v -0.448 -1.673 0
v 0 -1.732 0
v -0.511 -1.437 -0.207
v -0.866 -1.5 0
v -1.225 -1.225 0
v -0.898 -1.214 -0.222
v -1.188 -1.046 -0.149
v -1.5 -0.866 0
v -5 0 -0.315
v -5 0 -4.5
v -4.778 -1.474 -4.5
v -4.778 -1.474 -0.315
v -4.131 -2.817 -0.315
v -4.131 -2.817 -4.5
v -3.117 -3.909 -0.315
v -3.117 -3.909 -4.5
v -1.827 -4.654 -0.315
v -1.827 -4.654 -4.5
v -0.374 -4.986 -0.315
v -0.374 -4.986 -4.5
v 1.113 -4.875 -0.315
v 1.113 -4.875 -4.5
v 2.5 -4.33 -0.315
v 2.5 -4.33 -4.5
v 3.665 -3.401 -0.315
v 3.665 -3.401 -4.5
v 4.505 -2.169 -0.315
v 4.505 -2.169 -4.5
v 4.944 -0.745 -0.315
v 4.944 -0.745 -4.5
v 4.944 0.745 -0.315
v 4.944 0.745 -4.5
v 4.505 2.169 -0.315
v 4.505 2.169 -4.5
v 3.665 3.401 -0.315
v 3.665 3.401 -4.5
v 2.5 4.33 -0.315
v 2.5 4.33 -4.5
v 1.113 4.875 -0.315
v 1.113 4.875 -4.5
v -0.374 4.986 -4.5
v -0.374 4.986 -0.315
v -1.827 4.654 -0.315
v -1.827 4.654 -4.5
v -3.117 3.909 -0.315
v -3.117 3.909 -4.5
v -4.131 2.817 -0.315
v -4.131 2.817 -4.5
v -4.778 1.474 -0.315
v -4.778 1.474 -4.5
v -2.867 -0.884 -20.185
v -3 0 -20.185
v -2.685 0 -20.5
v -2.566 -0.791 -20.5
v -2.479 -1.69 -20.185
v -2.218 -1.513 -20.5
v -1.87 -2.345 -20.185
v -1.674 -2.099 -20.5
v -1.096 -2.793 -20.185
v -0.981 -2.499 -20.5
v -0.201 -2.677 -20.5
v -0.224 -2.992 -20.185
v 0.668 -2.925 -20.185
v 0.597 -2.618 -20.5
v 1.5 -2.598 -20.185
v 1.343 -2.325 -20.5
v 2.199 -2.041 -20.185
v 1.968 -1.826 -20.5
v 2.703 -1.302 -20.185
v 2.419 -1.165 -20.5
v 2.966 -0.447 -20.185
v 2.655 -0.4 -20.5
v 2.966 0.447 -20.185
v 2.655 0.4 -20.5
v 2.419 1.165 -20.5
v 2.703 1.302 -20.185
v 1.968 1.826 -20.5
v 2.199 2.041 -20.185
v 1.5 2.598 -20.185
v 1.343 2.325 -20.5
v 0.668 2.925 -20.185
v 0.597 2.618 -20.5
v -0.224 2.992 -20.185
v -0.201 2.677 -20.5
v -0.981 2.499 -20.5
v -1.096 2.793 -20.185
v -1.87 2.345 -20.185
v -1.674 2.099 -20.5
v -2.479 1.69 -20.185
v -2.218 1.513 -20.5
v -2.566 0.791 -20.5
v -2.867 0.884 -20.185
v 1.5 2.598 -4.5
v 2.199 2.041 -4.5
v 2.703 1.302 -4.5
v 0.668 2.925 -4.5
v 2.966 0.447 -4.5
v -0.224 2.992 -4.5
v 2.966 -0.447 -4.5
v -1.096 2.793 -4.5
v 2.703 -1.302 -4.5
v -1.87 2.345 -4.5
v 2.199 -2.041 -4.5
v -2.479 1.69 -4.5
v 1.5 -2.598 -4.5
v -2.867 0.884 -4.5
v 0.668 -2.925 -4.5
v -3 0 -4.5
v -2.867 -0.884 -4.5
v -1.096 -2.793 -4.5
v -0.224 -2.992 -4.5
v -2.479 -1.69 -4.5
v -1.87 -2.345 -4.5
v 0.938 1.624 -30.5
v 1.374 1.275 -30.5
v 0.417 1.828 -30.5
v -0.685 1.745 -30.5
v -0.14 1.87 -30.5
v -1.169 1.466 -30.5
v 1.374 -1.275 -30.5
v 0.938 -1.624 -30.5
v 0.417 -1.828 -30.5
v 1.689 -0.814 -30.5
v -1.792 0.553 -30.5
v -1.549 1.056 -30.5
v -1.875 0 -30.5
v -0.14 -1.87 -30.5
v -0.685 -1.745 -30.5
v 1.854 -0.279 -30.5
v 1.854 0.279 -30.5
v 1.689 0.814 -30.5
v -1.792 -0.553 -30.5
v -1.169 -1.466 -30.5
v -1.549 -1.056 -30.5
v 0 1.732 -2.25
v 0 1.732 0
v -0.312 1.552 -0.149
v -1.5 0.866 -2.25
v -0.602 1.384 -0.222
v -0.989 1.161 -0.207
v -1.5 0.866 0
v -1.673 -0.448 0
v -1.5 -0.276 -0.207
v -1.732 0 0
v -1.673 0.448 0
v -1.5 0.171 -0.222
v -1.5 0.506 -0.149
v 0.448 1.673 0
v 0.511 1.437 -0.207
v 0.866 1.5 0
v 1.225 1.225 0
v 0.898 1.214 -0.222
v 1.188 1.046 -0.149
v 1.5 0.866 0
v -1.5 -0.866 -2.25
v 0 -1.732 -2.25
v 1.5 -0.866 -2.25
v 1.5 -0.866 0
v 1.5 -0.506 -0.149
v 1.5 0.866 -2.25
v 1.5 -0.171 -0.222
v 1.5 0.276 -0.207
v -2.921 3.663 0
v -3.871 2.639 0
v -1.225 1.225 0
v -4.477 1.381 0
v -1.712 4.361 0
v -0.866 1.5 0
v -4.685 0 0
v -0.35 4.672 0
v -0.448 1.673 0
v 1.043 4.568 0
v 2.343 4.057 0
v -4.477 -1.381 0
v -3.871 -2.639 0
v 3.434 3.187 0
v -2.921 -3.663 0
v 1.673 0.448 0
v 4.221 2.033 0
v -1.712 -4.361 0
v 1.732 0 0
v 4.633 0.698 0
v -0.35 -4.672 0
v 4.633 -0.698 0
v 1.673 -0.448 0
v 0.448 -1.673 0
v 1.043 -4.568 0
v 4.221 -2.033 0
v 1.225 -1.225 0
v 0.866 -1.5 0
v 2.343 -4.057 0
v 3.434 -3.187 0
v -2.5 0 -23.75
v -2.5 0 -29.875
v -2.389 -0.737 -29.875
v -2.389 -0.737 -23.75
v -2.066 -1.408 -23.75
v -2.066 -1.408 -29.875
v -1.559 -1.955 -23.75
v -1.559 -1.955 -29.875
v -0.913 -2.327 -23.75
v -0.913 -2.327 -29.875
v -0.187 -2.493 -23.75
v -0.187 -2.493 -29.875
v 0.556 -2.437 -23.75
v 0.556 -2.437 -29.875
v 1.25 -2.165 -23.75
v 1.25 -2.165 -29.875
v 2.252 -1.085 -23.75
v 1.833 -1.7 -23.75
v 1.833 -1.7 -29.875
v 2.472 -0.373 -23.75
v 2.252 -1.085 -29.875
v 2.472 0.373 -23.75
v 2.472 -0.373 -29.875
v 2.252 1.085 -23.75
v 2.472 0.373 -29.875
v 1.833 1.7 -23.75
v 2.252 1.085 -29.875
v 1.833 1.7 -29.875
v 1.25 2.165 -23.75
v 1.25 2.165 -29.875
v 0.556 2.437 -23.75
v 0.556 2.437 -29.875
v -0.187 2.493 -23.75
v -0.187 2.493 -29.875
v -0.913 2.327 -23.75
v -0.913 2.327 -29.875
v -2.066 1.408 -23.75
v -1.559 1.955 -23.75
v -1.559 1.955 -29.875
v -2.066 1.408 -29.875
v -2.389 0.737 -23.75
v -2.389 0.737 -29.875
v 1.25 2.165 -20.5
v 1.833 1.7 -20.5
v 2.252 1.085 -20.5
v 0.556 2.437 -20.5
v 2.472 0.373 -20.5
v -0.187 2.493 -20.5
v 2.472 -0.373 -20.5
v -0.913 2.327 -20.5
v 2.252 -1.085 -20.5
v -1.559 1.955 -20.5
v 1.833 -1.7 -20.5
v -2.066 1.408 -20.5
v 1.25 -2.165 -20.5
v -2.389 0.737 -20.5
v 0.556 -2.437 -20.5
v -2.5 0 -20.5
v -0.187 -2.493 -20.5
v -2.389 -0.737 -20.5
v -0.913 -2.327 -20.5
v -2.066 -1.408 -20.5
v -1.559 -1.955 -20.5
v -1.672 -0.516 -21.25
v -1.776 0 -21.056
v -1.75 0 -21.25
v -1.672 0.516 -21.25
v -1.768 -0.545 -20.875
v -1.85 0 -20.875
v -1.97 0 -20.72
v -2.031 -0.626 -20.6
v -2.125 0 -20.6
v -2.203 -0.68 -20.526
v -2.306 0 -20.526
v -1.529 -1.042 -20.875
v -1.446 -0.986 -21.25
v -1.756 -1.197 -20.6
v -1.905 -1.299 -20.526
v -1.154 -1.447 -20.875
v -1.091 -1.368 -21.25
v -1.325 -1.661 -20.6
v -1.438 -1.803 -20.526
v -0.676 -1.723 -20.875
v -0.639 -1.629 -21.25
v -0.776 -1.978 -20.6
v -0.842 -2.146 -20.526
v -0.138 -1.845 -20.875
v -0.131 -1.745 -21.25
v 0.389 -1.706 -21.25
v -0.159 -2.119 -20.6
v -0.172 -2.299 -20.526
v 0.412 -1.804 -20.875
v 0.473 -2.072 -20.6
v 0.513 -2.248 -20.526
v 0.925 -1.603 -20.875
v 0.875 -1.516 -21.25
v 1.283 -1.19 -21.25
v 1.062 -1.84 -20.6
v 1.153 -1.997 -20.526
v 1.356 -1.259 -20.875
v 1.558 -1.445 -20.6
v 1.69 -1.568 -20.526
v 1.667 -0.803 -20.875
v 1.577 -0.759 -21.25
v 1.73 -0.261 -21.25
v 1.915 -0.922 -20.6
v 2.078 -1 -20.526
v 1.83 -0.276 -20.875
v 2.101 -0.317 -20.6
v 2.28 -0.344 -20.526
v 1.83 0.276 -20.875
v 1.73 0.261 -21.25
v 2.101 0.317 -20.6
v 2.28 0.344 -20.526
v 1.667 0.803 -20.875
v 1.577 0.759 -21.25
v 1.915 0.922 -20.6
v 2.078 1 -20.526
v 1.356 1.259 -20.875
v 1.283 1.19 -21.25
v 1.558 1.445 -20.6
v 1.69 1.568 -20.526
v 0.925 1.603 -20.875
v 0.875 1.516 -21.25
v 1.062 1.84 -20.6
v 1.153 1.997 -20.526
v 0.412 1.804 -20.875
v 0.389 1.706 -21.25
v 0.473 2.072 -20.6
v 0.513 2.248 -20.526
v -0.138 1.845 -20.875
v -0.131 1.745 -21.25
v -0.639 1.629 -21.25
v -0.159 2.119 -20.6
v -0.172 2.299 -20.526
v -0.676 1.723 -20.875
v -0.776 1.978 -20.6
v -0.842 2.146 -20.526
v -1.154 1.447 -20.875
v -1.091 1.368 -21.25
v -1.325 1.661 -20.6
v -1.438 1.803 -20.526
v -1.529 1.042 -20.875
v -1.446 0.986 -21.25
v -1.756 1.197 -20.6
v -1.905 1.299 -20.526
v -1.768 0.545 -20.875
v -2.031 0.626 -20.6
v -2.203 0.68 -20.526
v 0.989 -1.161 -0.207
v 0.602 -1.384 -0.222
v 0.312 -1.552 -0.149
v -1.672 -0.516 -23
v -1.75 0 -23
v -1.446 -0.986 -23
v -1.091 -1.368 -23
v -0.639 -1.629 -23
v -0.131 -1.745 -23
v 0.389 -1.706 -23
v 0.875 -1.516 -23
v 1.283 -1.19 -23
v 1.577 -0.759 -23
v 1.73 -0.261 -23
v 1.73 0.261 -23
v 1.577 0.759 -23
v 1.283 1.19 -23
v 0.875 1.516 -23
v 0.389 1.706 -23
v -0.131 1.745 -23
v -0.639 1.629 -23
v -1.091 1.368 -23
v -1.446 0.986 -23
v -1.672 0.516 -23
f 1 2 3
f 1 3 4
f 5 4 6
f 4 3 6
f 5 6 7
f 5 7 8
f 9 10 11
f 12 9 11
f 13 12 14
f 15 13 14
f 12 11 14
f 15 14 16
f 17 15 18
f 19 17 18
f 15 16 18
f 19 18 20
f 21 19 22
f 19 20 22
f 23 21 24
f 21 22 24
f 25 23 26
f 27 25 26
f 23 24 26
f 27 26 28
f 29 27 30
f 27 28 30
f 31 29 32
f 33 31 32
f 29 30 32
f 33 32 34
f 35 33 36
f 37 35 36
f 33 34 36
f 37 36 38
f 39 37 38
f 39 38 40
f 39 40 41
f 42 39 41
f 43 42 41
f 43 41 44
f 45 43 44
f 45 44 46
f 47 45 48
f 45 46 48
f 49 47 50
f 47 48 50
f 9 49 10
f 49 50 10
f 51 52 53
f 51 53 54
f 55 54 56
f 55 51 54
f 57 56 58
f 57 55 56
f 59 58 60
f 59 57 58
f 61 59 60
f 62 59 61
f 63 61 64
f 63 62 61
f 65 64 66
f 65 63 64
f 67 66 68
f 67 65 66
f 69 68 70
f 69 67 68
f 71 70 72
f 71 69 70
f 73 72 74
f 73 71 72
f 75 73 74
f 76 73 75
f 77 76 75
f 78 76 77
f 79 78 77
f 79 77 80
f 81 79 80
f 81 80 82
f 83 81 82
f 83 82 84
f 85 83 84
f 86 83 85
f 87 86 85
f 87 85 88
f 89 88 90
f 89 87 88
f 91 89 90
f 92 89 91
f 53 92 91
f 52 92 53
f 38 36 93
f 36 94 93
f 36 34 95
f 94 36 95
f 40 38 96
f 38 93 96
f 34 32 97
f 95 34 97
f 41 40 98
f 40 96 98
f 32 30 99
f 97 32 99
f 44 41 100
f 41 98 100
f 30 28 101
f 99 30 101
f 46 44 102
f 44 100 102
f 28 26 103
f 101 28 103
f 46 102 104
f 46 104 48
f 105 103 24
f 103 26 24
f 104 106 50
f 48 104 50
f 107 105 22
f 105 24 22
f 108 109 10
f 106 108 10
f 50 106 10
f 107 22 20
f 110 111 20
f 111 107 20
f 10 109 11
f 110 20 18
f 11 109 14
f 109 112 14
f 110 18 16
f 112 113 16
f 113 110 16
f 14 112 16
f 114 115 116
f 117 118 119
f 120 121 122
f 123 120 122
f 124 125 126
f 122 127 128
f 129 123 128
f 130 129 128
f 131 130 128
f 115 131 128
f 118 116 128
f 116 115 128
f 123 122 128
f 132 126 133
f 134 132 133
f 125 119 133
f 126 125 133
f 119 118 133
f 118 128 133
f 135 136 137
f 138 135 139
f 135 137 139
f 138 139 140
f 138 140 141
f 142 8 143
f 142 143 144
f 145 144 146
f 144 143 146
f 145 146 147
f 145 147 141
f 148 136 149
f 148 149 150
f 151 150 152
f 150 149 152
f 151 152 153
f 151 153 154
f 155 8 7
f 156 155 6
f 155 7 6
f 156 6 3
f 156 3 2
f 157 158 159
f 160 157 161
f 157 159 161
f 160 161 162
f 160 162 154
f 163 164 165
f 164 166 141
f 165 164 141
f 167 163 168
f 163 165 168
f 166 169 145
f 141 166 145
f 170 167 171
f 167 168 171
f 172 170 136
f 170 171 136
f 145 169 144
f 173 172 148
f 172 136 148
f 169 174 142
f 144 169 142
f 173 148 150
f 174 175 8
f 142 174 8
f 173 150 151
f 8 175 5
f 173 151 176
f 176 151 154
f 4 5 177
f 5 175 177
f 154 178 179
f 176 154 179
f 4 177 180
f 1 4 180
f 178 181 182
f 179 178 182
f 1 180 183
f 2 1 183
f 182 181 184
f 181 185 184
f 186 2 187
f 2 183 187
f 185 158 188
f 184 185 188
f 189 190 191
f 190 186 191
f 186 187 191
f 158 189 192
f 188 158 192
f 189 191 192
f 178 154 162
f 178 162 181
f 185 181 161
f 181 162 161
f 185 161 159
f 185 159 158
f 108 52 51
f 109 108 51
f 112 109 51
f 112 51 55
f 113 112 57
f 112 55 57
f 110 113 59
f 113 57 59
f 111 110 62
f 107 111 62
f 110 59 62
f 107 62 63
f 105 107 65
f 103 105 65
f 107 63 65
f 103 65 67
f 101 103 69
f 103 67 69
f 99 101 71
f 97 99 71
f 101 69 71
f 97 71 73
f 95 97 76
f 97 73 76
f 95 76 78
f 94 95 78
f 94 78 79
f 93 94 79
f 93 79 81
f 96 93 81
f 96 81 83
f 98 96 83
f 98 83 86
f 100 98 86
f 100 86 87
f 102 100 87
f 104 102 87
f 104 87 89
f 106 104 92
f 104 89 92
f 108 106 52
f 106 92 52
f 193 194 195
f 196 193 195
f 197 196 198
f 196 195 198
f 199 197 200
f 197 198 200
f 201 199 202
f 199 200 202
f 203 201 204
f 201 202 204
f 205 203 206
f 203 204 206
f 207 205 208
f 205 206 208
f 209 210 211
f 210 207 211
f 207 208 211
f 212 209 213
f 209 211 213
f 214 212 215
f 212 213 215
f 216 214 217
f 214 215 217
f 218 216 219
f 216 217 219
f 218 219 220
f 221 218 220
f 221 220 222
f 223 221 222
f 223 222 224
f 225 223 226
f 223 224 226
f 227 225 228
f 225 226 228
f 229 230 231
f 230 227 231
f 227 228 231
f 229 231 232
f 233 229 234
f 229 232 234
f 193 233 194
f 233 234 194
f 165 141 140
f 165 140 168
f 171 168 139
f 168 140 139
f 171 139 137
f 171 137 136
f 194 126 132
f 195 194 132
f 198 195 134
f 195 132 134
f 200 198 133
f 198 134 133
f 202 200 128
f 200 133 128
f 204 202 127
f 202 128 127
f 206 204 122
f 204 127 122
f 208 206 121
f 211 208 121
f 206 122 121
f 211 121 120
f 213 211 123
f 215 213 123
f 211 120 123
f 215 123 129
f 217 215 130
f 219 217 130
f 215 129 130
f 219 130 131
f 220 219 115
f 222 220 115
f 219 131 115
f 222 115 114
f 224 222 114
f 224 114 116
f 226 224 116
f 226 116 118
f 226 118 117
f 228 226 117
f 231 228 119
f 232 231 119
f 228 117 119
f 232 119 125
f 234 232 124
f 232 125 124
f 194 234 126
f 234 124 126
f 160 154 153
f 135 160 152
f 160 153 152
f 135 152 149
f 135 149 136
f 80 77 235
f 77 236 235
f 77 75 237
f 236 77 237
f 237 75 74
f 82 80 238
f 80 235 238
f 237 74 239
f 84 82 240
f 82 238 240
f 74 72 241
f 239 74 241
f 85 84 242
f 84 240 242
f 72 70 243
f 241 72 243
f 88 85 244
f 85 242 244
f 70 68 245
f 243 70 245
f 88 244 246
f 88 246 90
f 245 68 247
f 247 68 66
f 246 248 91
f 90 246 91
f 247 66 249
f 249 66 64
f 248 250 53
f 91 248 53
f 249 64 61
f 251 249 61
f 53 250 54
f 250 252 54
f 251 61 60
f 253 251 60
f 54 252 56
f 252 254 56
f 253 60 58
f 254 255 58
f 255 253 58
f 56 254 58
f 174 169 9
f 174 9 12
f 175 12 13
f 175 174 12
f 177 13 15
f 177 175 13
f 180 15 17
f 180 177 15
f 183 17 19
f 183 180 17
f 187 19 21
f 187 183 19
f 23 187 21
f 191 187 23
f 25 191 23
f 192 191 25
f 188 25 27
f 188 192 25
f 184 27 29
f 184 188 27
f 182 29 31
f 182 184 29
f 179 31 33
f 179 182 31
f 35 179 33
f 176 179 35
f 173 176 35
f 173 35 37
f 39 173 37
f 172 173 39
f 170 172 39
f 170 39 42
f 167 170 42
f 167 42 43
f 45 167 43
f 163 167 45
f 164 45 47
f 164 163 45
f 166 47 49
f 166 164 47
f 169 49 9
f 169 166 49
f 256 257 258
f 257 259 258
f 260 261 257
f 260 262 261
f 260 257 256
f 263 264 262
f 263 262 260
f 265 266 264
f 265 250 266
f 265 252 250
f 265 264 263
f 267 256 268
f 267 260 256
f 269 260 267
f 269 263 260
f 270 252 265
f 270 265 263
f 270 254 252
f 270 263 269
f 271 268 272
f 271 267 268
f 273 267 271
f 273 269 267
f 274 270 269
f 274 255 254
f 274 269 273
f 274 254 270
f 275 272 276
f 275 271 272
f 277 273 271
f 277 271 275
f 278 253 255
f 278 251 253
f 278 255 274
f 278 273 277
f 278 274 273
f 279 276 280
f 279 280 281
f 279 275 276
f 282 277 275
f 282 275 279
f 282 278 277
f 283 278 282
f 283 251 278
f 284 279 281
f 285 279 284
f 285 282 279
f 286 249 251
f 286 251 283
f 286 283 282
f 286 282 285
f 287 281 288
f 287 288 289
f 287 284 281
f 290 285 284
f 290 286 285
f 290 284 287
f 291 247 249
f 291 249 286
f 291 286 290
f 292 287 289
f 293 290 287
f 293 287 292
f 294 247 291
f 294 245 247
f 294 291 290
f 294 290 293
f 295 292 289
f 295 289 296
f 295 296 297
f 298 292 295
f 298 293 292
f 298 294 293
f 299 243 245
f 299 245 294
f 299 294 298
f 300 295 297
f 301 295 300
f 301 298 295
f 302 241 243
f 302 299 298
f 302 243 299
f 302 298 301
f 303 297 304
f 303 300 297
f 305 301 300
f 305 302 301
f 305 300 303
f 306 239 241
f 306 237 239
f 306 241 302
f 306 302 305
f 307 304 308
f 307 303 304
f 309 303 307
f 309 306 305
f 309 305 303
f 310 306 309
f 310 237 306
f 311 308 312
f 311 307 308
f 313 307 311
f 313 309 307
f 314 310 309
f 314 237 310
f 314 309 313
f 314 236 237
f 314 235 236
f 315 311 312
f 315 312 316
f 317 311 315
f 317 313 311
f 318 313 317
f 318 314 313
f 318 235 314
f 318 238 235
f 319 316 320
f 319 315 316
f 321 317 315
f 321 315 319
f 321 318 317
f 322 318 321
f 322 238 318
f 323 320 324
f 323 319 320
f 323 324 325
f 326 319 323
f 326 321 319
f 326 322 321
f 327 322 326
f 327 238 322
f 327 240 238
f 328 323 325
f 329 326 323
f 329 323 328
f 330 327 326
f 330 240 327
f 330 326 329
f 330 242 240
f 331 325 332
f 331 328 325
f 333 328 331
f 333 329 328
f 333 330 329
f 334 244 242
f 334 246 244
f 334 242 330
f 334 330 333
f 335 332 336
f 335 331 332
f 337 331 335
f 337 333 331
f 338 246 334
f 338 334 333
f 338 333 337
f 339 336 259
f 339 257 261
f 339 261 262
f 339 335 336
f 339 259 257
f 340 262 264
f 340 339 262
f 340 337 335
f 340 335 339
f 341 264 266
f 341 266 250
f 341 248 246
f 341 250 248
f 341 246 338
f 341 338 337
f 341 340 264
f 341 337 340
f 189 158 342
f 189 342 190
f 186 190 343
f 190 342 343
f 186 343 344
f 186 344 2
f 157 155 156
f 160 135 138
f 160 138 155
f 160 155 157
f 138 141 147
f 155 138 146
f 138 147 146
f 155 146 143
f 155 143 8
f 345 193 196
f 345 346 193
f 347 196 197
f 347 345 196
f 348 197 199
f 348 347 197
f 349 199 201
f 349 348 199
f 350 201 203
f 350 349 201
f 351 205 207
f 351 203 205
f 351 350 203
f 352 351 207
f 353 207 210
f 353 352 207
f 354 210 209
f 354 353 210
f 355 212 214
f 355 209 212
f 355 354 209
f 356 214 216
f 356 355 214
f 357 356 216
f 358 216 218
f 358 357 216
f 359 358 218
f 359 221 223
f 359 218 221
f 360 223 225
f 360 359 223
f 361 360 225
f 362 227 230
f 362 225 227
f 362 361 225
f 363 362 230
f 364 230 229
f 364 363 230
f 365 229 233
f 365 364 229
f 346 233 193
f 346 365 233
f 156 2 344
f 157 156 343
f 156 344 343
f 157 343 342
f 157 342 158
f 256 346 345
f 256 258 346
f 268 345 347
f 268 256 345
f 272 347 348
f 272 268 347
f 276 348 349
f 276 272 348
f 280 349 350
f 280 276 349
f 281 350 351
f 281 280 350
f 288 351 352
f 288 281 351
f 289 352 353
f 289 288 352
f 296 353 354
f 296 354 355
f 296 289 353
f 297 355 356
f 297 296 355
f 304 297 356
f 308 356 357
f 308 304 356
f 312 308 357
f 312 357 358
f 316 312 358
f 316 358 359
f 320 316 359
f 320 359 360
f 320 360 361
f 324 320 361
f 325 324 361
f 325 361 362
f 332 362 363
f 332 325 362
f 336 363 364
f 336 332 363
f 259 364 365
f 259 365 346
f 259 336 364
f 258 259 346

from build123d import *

# Parameters (mm, degrees)
CHAMFER1_SIZE      = 0.625
CHAMFER2_SIZE      = 0.315
CUT_EXTRUDE3_DEPTH = 2.25


with BuildPart() as part:
    # Sketch1 → Revolve1 (revolve)
    with BuildSketch(Plane(origin=(0, 0, 0), x_dir=(0, 0, -1), z_dir=(1, 0, 0))):
        Polygon((0, 5), (4.5, 5), (4.5, 3), (20.5, 3), (20.5, 2.5), (30.5, 2.5), (30.5, 0), (0, 0), align=None)
    revolve(axis=Axis((0, 0, -30.5), (0, 0, 1)))

    # Sketch5 → Cut-Revolve1 (revolve, cut)
    with BuildSketch(Plane(origin=(0, 0, 0), x_dir=(0, 0, -1), z_dir=(1, 0, 0))):
        with BuildLine():
            Line((20.5, 3), (24.250000008, 3))
            Line((24.250000008, 3), (23, 1.749999993))
            Line((23, 1.749999993), (21.250000008, 1.749999993))
            ThreePointArc((21.250000008, 1.749999993), (20.719669916, 1.969669909), (20.5, 2.5))
            Line((20.5, 2.5), (20.5, 3))
        make_face()
    revolve(axis=Axis((0, 0, -30.5), (0, 0, 1)), mode=Mode.SUBTRACT)

    # Chamfer1
    chamfer1_edges = [part.edges().sort_by_distance(p)[0] for p in [
        (0, -2.5, -30.5),
    ]]
    chamfer(chamfer1_edges, length=CHAMFER1_SIZE)

    # Chamfer2
    chamfer2_edges = [part.edges().sort_by_distance(p)[0] for p in [
        (0, -5, 0),
        (0, -3, -20.5),
    ]]
    chamfer(chamfer2_edges, length=CHAMFER2_SIZE)

    # Sketch8 → Cut-Extrude3 (cut)
    with BuildSketch(Plane.XY):
        Polygon((1.5, 0.866025404), (0, 1.732050808), (-1.5, 0.866025404), (-1.5, -0.866025404), (0, -1.732050808), (1.5, -0.866025404), align=None)
    extrude(amount=-CUT_EXTRUDE3_DEPTH, mode=Mode.SUBTRACT)

    # Cut-Extrude4 cone 1 section (through the dimple's axis) → Cut-Extrude4 (revolve, cut)
    with BuildSketch(Plane(origin=(0, 0, 0), x_dir=(0, -1, 0), z_dir=(1, 0, 0))):
        Polygon((0, 0), (1.732050808, 0), (0, 1.732050808), align=None)
    revolve(axis=Axis((0, 0, 0), (0, 0, -1)), mode=Mode.SUBTRACT)


solid = part.part
